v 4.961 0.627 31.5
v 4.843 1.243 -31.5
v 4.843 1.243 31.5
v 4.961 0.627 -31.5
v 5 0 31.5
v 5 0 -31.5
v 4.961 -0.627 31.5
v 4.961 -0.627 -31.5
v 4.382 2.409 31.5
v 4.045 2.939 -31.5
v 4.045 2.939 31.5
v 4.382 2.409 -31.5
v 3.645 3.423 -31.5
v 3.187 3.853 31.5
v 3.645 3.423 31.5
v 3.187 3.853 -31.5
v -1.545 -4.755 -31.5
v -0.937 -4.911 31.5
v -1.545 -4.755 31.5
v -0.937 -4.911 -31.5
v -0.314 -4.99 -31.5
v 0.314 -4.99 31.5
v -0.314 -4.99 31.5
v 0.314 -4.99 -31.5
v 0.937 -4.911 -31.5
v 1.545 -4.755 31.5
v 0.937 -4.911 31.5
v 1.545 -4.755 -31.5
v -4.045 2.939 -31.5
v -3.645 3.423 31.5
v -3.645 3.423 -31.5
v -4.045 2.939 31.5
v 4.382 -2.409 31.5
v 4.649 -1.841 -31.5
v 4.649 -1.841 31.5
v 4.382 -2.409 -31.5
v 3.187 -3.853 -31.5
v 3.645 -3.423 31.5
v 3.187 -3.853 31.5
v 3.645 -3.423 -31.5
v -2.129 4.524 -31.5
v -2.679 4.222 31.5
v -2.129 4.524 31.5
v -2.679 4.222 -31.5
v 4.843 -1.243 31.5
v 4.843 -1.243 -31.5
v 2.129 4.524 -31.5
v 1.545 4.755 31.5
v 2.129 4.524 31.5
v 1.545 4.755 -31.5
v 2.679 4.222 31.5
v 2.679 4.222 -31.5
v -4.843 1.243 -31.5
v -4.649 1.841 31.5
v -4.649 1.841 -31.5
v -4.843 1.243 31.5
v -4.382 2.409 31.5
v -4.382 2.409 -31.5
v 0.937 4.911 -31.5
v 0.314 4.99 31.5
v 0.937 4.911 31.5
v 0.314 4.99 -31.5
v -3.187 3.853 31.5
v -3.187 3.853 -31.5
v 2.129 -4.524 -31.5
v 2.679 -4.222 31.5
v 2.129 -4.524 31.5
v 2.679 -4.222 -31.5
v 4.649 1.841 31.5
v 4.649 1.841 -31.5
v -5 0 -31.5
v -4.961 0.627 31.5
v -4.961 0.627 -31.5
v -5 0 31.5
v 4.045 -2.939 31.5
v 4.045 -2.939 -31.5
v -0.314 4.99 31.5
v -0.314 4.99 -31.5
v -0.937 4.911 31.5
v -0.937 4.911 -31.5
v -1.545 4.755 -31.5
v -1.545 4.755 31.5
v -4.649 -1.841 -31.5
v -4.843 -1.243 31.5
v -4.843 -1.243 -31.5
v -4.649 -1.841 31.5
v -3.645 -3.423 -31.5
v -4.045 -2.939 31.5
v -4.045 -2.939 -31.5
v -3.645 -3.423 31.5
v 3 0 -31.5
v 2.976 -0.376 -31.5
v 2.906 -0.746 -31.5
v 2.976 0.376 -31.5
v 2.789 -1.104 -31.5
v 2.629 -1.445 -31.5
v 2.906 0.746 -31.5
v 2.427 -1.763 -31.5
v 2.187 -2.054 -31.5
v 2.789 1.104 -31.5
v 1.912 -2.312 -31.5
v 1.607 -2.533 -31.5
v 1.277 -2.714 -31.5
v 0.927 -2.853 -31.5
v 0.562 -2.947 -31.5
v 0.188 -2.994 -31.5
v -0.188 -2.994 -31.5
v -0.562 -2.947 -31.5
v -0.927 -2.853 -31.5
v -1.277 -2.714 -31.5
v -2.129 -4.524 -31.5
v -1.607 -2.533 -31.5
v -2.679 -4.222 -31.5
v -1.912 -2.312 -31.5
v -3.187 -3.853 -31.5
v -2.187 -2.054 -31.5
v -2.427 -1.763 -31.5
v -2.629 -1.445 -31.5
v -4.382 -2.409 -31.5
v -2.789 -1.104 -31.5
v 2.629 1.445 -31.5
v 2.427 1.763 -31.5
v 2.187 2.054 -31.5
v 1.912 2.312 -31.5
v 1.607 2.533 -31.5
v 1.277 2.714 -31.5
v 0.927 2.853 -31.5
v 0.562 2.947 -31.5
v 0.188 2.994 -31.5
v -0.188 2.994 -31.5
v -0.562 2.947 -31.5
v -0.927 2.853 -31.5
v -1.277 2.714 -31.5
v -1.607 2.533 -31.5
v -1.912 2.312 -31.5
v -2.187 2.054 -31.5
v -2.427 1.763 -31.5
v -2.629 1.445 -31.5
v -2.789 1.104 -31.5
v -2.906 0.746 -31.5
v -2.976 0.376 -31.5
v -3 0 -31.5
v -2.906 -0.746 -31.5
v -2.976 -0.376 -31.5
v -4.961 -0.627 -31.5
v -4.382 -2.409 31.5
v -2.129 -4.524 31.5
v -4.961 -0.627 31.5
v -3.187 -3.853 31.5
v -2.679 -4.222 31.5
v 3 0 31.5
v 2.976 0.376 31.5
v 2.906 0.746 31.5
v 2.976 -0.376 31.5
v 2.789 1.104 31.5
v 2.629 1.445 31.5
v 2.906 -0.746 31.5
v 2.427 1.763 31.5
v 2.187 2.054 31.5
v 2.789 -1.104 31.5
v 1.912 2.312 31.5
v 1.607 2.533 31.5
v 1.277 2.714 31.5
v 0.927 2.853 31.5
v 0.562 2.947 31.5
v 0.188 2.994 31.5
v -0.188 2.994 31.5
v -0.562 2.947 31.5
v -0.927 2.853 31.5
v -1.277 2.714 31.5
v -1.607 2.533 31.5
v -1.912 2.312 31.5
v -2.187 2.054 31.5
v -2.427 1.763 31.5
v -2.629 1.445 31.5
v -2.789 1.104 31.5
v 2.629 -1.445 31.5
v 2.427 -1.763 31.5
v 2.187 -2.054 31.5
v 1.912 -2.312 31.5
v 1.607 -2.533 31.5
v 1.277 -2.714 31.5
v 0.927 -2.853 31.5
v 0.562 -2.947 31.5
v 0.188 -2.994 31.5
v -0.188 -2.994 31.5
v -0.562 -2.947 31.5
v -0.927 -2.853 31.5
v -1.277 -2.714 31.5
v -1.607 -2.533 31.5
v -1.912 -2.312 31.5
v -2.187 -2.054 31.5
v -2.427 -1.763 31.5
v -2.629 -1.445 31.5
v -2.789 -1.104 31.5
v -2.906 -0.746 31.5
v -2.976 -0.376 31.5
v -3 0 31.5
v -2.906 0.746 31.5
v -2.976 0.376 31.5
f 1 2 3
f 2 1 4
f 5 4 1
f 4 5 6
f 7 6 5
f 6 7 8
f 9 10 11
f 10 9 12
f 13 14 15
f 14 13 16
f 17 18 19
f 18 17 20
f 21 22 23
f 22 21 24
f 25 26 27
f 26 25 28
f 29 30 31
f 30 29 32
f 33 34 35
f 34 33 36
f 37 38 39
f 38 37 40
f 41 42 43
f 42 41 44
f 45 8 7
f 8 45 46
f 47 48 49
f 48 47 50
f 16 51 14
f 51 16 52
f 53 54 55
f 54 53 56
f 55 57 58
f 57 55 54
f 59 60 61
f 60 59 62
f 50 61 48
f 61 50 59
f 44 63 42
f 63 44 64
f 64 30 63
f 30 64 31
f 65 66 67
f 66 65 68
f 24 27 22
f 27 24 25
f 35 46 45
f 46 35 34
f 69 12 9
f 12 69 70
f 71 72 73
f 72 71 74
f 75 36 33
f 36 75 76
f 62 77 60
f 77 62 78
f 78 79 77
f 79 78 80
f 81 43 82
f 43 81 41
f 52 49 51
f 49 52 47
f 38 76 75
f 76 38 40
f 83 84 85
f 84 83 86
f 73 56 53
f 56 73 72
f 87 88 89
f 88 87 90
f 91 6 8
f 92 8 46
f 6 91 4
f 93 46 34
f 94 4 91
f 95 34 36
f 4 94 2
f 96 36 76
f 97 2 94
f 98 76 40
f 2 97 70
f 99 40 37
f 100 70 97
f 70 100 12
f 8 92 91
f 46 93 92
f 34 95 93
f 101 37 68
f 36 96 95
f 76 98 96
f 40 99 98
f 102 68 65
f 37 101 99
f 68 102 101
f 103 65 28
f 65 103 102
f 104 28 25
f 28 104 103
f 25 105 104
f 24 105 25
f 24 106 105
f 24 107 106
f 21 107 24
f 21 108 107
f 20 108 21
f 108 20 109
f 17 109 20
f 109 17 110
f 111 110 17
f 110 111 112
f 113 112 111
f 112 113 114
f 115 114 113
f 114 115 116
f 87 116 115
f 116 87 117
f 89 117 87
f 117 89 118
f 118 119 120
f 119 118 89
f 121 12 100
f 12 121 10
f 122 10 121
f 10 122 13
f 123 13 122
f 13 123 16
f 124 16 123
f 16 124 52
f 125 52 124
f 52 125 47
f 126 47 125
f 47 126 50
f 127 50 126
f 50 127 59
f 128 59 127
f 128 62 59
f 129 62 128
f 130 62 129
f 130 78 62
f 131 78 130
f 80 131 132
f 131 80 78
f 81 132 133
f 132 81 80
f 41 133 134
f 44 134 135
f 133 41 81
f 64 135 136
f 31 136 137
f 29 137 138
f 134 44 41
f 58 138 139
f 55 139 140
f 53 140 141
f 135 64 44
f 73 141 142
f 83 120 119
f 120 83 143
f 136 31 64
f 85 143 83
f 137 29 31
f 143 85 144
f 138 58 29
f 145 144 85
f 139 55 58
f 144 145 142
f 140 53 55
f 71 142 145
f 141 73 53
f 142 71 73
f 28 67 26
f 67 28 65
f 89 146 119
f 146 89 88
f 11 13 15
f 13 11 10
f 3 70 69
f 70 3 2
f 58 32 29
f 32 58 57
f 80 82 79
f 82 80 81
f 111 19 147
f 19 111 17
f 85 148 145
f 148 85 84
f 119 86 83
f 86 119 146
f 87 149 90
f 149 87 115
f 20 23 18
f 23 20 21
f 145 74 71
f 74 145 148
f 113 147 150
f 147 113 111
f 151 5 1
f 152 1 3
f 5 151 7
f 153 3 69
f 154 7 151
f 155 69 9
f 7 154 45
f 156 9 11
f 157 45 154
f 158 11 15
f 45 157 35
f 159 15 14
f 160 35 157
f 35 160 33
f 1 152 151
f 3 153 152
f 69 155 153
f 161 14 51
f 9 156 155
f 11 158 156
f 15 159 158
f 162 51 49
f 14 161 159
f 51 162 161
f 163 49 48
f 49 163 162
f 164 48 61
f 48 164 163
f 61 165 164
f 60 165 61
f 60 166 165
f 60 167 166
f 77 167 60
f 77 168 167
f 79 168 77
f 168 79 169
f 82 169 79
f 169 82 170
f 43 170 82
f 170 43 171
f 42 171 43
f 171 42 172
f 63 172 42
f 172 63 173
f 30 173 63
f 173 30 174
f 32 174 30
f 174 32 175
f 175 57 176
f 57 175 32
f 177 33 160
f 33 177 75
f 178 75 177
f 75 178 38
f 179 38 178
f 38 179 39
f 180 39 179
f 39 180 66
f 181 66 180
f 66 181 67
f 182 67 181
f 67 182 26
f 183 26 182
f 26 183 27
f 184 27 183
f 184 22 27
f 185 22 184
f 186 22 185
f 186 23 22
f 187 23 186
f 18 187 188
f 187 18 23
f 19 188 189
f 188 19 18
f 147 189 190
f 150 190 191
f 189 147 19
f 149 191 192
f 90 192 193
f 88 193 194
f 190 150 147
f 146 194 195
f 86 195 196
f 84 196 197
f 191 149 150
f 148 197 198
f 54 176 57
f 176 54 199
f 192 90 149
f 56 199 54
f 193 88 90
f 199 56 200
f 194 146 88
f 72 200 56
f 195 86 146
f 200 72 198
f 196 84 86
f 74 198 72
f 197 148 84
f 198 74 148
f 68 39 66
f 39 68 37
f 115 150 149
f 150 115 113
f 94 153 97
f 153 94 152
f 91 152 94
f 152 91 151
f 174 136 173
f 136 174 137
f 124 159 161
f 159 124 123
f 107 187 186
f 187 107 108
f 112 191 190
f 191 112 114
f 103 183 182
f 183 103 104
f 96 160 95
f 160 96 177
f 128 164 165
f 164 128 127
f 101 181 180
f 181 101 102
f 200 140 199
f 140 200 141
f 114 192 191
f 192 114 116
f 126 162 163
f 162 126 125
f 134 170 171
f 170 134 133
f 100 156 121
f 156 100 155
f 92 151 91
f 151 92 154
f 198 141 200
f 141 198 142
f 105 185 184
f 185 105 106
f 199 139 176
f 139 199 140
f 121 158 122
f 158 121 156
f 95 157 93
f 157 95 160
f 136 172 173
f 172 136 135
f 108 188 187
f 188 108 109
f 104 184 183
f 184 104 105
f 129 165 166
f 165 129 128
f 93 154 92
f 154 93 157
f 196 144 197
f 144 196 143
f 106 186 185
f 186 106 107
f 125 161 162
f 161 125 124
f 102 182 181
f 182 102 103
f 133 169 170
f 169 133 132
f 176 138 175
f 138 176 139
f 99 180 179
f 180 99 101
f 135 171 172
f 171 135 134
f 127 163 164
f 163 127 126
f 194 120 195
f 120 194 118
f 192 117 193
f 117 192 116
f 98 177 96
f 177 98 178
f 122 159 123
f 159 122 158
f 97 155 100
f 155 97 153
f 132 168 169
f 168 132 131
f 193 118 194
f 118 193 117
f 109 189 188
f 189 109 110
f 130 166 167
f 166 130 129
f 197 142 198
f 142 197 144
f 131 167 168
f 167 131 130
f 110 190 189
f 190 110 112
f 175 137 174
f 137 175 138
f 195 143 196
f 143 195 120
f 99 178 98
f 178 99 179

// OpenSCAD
$fn = 50;


difference() {
	union() {
		translate(v = [0, 0, -31.5000000000]) {
			cylinder(h = 63, r = 5.0000000000);
		}
	}
	union() {
		translate(v = [0, 0, -100.0000000000]) {
			cylinder(h = 200, r = 3.0000000000);
		}
	}
}
